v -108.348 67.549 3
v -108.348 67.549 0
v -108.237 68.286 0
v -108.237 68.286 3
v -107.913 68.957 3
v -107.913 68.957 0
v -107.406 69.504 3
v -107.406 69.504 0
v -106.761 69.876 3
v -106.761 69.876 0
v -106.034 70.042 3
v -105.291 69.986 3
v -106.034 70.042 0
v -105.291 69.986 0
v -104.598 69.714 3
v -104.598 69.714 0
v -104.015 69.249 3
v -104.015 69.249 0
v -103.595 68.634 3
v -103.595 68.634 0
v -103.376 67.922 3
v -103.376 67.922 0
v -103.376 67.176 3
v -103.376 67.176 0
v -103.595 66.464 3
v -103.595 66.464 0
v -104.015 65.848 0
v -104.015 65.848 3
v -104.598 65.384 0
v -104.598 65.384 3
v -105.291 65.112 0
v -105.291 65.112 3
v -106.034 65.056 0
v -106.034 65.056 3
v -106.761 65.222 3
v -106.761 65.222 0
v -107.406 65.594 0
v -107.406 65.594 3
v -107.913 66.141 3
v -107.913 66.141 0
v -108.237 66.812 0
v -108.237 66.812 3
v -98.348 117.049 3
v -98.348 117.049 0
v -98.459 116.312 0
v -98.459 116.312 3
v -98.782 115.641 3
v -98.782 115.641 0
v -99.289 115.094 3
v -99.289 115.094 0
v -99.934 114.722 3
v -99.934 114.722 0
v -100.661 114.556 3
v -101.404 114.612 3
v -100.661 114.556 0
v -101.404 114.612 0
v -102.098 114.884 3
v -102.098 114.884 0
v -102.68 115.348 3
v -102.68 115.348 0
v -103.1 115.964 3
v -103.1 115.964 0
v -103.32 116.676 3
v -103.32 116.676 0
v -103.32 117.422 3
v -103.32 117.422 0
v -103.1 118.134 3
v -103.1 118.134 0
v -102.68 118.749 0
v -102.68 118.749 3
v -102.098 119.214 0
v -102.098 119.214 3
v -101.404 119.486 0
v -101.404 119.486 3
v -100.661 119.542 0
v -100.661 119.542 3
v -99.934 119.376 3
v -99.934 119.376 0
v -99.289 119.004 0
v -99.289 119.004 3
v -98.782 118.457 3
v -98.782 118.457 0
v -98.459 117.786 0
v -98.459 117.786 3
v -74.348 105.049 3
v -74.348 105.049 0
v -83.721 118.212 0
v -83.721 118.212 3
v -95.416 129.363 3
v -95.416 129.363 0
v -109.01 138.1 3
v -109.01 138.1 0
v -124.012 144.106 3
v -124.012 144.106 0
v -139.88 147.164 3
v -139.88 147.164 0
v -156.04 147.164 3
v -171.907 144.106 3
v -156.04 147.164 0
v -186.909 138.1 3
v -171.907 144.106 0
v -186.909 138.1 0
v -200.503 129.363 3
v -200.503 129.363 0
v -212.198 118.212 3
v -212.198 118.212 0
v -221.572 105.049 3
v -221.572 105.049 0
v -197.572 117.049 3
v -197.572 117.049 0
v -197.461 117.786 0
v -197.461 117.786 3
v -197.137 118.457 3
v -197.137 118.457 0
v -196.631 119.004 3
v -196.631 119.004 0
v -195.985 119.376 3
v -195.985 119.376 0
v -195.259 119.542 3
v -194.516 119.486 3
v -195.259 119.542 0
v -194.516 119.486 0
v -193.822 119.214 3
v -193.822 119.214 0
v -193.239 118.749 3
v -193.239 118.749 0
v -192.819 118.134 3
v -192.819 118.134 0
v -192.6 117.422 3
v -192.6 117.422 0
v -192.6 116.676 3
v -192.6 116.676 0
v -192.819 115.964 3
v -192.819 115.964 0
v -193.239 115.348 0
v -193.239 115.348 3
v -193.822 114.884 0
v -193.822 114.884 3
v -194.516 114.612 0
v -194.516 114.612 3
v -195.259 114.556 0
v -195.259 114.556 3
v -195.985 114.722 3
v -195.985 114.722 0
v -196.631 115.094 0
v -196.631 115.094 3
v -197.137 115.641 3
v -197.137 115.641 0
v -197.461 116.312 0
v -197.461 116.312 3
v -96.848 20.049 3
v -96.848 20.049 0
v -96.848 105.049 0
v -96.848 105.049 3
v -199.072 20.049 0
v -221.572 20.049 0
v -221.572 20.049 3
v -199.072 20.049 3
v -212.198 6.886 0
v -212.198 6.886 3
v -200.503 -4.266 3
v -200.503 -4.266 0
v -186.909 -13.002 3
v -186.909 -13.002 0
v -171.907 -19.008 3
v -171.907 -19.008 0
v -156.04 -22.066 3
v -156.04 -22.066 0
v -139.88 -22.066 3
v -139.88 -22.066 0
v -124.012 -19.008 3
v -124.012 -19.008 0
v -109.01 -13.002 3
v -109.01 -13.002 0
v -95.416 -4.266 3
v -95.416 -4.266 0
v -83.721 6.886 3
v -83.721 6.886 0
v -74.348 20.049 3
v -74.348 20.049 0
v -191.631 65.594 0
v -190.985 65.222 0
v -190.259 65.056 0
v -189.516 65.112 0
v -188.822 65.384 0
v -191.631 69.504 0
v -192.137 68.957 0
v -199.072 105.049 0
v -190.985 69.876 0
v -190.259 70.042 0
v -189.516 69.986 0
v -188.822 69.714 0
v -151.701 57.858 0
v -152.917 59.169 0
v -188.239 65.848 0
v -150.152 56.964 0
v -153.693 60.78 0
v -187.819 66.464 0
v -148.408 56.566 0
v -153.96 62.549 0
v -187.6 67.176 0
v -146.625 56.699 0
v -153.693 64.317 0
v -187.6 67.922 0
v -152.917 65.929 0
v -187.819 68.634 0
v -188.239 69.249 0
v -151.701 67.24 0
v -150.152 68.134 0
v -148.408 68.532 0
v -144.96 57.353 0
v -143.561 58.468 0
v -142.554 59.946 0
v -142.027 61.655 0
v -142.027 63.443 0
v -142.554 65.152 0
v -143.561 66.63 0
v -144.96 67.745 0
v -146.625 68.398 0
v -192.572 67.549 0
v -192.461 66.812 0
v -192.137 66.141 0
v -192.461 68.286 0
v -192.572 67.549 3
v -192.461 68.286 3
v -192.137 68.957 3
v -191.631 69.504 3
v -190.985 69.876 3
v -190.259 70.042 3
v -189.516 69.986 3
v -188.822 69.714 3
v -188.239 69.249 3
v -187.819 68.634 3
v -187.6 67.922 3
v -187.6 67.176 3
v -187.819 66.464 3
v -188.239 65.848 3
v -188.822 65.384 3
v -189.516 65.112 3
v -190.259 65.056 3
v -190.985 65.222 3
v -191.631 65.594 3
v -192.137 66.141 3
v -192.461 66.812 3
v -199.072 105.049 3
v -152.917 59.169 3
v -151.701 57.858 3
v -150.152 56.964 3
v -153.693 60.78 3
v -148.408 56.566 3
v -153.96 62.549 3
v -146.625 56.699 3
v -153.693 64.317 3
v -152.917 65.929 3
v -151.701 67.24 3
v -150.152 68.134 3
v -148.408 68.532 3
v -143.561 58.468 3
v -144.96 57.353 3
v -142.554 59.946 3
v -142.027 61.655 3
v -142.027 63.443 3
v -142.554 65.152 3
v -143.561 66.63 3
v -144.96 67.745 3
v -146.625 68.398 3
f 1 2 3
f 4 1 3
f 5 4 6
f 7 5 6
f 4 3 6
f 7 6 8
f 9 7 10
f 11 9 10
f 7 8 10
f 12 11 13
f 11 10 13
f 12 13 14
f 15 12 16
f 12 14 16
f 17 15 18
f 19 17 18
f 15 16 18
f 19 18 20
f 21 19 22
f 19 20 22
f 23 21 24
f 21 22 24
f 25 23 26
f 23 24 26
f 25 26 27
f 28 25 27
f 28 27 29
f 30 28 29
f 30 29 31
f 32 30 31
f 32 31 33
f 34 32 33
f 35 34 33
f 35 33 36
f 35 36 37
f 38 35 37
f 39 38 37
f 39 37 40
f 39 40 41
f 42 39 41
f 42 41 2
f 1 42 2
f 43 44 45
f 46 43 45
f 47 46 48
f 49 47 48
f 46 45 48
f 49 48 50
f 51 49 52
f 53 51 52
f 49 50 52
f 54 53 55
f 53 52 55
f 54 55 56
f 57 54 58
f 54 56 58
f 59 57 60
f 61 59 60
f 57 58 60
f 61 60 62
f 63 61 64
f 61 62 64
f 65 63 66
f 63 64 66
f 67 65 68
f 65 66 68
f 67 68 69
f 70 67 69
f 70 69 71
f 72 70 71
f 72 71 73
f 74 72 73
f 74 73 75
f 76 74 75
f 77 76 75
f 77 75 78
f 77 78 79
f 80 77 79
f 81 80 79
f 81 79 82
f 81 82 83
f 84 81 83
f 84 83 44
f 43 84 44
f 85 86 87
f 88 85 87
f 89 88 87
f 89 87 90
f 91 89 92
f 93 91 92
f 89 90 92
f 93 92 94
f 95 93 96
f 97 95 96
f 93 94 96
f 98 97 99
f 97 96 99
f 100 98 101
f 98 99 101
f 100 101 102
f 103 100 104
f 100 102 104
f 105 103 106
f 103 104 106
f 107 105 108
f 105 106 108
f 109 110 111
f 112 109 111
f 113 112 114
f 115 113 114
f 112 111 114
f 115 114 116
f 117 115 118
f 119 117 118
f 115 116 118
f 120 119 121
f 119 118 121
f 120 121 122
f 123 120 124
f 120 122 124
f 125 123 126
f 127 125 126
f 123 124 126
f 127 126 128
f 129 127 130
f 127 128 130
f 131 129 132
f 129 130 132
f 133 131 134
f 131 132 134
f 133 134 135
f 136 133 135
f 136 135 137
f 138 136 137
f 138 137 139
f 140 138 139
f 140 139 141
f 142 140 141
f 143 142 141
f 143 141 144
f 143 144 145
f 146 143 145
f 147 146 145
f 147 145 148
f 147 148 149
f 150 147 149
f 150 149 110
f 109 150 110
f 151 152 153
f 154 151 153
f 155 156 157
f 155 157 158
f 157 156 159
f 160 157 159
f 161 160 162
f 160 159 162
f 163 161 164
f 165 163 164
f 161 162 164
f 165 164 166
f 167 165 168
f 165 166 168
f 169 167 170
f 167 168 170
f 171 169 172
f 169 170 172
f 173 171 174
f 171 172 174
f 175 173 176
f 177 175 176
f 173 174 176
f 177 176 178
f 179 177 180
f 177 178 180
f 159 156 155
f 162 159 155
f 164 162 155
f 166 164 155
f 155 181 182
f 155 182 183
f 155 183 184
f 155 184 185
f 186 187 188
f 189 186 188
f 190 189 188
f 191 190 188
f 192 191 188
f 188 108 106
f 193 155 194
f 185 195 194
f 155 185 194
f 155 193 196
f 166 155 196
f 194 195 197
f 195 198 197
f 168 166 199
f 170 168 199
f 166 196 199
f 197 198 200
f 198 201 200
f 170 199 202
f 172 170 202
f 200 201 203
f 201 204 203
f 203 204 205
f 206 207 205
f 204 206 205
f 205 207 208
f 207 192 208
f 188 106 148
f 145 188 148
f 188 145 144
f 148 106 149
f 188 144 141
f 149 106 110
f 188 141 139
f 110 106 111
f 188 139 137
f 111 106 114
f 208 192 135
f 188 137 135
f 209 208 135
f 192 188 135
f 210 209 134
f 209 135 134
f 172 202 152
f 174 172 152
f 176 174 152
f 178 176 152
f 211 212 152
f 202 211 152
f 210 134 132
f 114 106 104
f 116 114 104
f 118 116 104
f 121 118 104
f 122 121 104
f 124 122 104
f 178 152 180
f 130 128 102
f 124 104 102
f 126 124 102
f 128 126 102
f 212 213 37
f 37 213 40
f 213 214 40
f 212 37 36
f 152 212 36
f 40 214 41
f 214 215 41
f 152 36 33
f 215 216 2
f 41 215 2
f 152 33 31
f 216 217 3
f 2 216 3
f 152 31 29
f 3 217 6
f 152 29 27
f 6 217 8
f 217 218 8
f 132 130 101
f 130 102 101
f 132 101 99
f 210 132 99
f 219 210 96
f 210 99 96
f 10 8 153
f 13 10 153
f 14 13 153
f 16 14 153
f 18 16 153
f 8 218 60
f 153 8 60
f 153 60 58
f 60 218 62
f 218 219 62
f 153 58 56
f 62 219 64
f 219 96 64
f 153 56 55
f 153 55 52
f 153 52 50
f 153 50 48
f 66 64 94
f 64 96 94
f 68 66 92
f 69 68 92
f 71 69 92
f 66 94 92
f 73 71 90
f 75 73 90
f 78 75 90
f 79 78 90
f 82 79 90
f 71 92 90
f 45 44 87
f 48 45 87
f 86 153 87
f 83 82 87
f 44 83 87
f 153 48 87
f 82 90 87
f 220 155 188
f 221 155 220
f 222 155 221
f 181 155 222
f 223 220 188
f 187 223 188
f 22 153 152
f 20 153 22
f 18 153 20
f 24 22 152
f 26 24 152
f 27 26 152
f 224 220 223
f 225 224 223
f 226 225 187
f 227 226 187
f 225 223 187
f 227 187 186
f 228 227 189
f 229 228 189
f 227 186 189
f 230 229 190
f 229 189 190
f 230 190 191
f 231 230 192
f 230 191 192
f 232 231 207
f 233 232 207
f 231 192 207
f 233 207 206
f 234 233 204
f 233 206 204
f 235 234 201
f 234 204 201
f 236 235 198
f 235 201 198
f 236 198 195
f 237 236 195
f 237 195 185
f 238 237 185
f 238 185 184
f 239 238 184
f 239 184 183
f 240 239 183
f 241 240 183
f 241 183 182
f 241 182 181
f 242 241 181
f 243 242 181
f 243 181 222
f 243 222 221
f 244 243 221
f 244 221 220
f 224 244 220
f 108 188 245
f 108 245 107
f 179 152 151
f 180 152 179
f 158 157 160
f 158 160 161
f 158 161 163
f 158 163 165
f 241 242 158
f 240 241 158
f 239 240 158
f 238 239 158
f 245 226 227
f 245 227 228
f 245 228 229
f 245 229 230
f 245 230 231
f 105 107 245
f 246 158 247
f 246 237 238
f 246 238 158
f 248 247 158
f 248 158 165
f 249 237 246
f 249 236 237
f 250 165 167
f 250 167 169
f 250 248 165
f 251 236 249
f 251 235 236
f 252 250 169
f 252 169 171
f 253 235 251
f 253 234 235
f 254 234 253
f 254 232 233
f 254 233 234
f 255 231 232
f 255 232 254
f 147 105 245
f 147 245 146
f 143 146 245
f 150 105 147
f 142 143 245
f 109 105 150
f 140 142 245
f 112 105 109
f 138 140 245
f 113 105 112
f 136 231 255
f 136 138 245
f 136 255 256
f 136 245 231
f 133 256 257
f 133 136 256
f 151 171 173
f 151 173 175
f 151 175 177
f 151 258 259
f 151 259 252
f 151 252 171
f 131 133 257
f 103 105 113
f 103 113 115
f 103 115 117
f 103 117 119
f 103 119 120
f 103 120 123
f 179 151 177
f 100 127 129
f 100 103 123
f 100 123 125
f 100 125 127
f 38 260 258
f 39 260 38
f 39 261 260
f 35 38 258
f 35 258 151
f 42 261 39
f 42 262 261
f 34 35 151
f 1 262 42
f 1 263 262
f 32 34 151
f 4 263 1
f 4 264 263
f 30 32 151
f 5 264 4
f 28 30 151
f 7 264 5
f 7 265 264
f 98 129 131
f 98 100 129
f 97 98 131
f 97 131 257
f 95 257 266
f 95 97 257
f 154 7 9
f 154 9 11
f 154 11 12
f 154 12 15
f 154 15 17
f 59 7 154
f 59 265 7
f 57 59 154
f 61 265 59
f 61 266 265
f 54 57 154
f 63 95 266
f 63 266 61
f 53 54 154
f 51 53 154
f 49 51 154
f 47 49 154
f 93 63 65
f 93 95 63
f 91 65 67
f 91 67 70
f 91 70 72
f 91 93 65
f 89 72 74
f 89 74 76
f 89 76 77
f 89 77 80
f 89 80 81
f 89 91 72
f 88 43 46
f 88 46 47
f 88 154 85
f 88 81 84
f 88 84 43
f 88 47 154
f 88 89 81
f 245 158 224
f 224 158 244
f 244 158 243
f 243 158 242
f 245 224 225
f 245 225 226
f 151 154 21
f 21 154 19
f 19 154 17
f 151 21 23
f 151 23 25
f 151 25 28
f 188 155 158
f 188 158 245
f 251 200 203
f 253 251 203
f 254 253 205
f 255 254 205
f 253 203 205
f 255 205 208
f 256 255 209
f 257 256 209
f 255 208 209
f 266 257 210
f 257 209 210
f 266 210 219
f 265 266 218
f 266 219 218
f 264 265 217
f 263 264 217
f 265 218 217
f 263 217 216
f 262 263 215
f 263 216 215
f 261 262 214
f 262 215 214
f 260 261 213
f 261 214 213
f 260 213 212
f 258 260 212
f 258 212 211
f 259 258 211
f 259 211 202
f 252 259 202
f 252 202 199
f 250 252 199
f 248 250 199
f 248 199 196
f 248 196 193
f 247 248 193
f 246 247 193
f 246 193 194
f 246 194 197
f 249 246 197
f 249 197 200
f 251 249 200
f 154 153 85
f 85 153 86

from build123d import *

# Parameters (mm, degrees)
ESQUISSE1_R              = 85
BOSS_EXTRU_1_DEPTH       = 3
ESQUISSE2_W              = 32.5
ESQUISSE2_H              = 85
ENL_V_MAT_EXTRU_6_DEPTH  = 3
ESQUISSE53_R             = 2.5
ENL_V_MAT_EXTRU_21_DEPTH = 10
ESQUISSE54_R             = 2.5
ENL_V_MAT_EXTRU_22_DEPTH = 10
ESQUISSE55_R             = 6
ENL_V_MAT_EXTRU_23_DEPTH = 10


with BuildPart() as part:
    # Esquisse1 → Boss.-Extru.1 (new body)
    with BuildSketch(Plane.XY):
        with Locations((-147.95974357, 62.548931244)):
            Circle(ESQUISSE1_R)
    extrude(amount=BOSS_EXTRU_1_DEPTH)

    # Esquisse2 → Enlèv. mat.-Extru.6 (cut)
    with BuildSketch(Plane.XY):
        with BuildLine():
            Line((-199.071902892, 105.048931244), (-221.571902892, 105.048931244))
            ThreePointArc((-221.571902892, 105.048931244), (-227.739869981, 91.876928617), (-231.571902892, 77.846212492))
            Line((-231.571902892, 77.846212492), (-231.571902892, 47.251649997))
            ThreePointArc((-231.571902892, 47.251649997), (-227.739869981, 33.220933871), (-221.571902892, 20.048931244))
            Line((-221.571902892, 20.048931244), (-199.071902892, 20.048931244))
            Line((-199.071902892, 20.048931244), (-199.071902892, 105.048931244))
        make_face()
        with Locations((-80.597584249, 62.548931244)):
            Rectangle(ESQUISSE2_W, ESQUISSE2_H)
    extrude(amount=ENL_V_MAT_EXTRU_6_DEPTH, mode=Mode.SUBTRACT)


with BuildPart() as enl_v_mat_extru_6_piece_1:
    # of the separate pieces the step leaves, piece 1, a body of its own (enl_v_mat_extru_6_pieces)
    add(part.part.solids().sort_by_distance((-74.347584249, 105.048931244, 0))[0])

    # Esquisse53 → Enlèv. mat.-Extru.21 (cut)
    with BuildSketch(Plane(origin=(0, 0, 0), x_dir=(-1, 0, 0), z_dir=(0, 0, -1))):
        with Locations((190.071902892, 67.548931244)):
            Circle(ESQUISSE53_R)
        with Locations((105.847584249, 67.548931244)):
            Circle(ESQUISSE53_R)
    extrude(amount=-ENL_V_MAT_EXTRU_21_DEPTH, mode=Mode.SUBTRACT)

    # Esquisse54 → Enlèv. mat.-Extru.22 (cut)
    with BuildSketch(Plane(origin=(0, 0, 0), x_dir=(-1, 0, 0), z_dir=(0, 0, -1))):
        with Locations((195.071902892, 117.048931244)):
            Circle(ESQUISSE54_R)
        with Locations(Location((100.847584249, 117.048931244, 0), (0, 0, 180))):
            Circle(ESQUISSE54_R)
    extrude(amount=-ENL_V_MAT_EXTRU_22_DEPTH, mode=Mode.SUBTRACT)

    # Esquisse55 → Enlèv. mat.-Extru.23 (cut)
    with BuildSketch(Plane(origin=(0, 0, 0), x_dir=(-1, 0, 0), z_dir=(0, 0, -1))):
        with Locations((147.95974357, 62.548931244)):
            Circle(ESQUISSE55_R)
    extrude(amount=-ENL_V_MAT_EXTRU_23_DEPTH, mode=Mode.SUBTRACT)


with BuildPart() as enl_v_mat_extru_6_piece_2:
    # of the separate pieces the step leaves, piece 2, a body of its own (enl_v_mat_extru_6_pieces)
    add(part.part.solids().sort_by_distance((-64.347584249, 47.251649997, 0))[0])


with BuildPart() as enl_v_mat_extru_6_piece_3:
    # of the separate pieces the step leaves, piece 3, a body of its own (enl_v_mat_extru_6_pieces)
    add(part.part.solids().sort_by_distance((-231.571902892, 77.846212492, 0))[0])


solid = enl_v_mat_extru_6_piece_1.part
